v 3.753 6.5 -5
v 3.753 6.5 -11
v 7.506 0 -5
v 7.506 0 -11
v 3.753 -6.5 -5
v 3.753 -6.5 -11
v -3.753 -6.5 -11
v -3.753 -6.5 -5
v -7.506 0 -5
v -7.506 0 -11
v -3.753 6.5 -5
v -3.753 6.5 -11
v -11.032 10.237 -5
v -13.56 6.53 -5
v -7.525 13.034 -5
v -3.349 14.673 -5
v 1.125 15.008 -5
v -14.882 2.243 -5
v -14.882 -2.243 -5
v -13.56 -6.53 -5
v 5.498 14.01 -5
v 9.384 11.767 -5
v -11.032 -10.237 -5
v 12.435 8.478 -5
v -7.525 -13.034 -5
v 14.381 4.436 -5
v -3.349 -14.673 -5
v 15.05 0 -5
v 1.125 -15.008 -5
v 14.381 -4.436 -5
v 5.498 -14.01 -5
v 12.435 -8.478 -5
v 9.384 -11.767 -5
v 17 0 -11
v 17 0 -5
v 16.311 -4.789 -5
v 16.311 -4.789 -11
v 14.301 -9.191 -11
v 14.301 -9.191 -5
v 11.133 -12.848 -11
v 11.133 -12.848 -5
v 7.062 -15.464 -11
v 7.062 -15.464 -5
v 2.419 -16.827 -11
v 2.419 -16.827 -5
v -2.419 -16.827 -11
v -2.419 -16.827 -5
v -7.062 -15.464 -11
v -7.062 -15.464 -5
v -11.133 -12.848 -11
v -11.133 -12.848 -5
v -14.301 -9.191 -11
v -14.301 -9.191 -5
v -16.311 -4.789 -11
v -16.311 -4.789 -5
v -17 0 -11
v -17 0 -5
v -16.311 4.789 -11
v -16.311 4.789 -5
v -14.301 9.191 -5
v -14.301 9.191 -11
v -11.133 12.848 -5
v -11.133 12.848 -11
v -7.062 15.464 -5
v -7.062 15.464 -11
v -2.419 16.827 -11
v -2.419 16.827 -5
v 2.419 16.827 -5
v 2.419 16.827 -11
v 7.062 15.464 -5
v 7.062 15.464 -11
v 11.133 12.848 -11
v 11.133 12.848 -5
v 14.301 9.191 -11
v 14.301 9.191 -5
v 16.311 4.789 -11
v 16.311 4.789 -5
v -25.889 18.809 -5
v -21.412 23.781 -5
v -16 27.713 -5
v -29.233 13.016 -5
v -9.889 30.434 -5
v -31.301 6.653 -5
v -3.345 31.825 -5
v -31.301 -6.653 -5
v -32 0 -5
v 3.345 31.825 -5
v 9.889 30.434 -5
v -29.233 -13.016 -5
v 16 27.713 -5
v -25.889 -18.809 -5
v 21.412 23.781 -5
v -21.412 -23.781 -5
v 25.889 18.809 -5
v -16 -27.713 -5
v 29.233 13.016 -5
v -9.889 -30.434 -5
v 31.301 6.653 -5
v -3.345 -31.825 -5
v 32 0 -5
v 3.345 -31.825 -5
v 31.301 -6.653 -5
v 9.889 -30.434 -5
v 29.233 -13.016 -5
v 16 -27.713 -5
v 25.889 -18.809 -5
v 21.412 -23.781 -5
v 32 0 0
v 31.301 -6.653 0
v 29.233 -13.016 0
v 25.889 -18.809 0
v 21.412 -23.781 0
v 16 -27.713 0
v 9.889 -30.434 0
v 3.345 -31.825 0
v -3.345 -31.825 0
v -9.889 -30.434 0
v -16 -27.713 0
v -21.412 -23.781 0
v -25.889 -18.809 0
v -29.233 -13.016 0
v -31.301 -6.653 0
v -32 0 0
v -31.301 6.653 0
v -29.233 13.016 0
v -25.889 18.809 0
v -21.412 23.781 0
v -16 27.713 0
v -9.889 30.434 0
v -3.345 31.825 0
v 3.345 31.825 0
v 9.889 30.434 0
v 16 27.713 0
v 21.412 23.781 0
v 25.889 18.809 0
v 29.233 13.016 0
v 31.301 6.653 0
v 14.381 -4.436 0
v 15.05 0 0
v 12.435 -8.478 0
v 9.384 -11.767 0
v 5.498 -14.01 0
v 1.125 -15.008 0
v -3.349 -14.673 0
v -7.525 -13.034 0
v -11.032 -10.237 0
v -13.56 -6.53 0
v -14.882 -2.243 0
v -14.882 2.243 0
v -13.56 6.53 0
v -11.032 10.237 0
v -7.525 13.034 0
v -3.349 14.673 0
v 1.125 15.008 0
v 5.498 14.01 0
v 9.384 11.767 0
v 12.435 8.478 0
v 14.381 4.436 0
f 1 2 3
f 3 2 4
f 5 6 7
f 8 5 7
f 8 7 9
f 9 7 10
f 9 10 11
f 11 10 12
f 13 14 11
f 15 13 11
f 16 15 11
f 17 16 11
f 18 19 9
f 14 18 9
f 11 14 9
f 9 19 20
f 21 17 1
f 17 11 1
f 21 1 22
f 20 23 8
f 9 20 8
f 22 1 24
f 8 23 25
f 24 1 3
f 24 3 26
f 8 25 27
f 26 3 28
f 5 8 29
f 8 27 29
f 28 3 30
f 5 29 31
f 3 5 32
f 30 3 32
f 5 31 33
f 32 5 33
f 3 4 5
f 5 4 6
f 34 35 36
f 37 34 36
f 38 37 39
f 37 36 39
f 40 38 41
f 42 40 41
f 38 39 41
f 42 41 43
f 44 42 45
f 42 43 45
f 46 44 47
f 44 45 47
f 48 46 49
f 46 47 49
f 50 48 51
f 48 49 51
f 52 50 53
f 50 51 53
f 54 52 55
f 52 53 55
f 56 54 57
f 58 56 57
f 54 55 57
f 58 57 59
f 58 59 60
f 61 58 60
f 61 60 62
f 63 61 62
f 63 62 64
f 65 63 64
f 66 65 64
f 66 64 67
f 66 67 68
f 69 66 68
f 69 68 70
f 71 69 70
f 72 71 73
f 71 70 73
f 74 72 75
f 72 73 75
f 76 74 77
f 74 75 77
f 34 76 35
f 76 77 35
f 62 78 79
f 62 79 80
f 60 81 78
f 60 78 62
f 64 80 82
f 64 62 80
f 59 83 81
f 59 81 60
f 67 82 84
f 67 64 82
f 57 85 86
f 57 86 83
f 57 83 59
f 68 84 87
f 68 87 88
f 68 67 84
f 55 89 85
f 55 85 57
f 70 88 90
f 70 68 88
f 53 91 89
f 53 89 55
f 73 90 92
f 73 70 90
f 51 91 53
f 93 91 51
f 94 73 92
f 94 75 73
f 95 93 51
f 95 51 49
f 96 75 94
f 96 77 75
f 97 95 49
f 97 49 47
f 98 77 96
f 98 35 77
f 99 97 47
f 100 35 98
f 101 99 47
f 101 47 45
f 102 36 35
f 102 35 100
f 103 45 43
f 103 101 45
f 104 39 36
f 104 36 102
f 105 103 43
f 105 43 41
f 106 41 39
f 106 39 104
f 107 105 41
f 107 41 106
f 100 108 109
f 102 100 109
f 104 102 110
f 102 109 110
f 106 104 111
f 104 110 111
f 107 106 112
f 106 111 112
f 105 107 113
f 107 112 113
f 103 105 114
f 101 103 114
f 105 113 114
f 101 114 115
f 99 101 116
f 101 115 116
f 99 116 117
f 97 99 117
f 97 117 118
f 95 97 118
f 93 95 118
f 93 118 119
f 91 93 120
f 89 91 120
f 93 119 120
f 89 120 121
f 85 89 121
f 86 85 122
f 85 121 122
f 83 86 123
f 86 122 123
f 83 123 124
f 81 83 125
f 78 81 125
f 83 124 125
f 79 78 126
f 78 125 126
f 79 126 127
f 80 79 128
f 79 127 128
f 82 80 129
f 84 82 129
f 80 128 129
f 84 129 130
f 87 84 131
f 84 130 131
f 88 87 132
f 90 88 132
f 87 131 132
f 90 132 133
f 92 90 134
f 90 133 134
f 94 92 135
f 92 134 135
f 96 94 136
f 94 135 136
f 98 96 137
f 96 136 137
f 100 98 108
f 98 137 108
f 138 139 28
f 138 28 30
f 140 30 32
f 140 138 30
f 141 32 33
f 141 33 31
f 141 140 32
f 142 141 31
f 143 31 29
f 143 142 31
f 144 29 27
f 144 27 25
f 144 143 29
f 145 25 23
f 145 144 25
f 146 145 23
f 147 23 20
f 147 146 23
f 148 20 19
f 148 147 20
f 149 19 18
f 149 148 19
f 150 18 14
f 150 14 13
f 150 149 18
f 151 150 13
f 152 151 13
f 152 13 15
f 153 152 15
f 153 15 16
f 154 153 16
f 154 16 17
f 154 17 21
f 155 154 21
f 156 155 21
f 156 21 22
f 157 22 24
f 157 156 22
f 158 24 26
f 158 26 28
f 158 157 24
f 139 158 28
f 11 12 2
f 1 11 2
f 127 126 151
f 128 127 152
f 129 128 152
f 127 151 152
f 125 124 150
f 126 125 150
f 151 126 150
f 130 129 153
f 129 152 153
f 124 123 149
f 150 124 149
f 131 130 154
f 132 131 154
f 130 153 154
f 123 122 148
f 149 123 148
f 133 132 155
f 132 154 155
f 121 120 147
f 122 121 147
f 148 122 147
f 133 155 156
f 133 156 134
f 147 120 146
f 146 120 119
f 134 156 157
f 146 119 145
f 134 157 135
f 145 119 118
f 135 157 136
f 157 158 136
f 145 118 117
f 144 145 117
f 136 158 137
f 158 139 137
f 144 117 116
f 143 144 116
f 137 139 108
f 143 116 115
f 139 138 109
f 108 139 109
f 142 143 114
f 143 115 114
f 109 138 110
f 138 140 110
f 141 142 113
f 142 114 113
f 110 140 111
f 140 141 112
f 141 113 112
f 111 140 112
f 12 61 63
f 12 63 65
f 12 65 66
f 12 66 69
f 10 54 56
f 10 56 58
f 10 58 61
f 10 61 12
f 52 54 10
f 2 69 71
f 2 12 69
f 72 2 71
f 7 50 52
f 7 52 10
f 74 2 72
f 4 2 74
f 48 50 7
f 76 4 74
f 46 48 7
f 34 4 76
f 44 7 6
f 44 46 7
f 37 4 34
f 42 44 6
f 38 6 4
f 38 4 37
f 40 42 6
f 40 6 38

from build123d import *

# Parameters (mm, degrees)
EXTRUDE008_DEPTH = 10
SKETCH010_R      = 17
EXTRUDE007_DEPTH = 6
SKETCH008_R      = 32
SKETCH008_R_2    = 15.05
EXTRUDE006_DEPTH = 5


with BuildPart() as extrude008:
    # Sketch012 (on Face1 of CopyExtrude007001) → Extrude008 (new body)
    with BuildSketch(Plane(origin=(0, 0, -11), x_dir=(1, 0, 0), z_dir=(0, 0, -1))):
        Polygon((-3.752777, -6.5), (3.752777, -6.5), (7.505553, 0), (3.752777, 6.5), (-3.752777, 6.5), (-7.505553, 0), align=None)
    extrude(amount=-EXTRUDE008_DEPTH)


with BuildPart() as cut005:
    # Sketch010 (on Face1 of CopyExtrude006001) → Extrude007 (new body)
    with BuildSketch(Plane(origin=(0, 0, -5), x_dir=(1, 0, 0), z_dir=(0, 0, -1))):
        Circle(SKETCH010_R)
    extrude(amount=EXTRUDE007_DEPTH)

    # Cut005: cut Extrude008
    add(extrude008.part, mode=Mode.SUBTRACT)


with BuildPart() as fusion002:
    # Sketch008 (on Face1 of CopyCut004001) → Extrude006 (new body)
    with BuildSketch(Plane(origin=(0, 0, 0), x_dir=(1, 0, 0), z_dir=(0, 0, -1))):
        Circle(SKETCH008_R)
        Circle(SKETCH008_R_2, mode=Mode.SUBTRACT)
    extrude(amount=EXTRUDE006_DEPTH)

    # Fusion002: union Cut005
    add(cut005.part)


solid = fusion002.part
